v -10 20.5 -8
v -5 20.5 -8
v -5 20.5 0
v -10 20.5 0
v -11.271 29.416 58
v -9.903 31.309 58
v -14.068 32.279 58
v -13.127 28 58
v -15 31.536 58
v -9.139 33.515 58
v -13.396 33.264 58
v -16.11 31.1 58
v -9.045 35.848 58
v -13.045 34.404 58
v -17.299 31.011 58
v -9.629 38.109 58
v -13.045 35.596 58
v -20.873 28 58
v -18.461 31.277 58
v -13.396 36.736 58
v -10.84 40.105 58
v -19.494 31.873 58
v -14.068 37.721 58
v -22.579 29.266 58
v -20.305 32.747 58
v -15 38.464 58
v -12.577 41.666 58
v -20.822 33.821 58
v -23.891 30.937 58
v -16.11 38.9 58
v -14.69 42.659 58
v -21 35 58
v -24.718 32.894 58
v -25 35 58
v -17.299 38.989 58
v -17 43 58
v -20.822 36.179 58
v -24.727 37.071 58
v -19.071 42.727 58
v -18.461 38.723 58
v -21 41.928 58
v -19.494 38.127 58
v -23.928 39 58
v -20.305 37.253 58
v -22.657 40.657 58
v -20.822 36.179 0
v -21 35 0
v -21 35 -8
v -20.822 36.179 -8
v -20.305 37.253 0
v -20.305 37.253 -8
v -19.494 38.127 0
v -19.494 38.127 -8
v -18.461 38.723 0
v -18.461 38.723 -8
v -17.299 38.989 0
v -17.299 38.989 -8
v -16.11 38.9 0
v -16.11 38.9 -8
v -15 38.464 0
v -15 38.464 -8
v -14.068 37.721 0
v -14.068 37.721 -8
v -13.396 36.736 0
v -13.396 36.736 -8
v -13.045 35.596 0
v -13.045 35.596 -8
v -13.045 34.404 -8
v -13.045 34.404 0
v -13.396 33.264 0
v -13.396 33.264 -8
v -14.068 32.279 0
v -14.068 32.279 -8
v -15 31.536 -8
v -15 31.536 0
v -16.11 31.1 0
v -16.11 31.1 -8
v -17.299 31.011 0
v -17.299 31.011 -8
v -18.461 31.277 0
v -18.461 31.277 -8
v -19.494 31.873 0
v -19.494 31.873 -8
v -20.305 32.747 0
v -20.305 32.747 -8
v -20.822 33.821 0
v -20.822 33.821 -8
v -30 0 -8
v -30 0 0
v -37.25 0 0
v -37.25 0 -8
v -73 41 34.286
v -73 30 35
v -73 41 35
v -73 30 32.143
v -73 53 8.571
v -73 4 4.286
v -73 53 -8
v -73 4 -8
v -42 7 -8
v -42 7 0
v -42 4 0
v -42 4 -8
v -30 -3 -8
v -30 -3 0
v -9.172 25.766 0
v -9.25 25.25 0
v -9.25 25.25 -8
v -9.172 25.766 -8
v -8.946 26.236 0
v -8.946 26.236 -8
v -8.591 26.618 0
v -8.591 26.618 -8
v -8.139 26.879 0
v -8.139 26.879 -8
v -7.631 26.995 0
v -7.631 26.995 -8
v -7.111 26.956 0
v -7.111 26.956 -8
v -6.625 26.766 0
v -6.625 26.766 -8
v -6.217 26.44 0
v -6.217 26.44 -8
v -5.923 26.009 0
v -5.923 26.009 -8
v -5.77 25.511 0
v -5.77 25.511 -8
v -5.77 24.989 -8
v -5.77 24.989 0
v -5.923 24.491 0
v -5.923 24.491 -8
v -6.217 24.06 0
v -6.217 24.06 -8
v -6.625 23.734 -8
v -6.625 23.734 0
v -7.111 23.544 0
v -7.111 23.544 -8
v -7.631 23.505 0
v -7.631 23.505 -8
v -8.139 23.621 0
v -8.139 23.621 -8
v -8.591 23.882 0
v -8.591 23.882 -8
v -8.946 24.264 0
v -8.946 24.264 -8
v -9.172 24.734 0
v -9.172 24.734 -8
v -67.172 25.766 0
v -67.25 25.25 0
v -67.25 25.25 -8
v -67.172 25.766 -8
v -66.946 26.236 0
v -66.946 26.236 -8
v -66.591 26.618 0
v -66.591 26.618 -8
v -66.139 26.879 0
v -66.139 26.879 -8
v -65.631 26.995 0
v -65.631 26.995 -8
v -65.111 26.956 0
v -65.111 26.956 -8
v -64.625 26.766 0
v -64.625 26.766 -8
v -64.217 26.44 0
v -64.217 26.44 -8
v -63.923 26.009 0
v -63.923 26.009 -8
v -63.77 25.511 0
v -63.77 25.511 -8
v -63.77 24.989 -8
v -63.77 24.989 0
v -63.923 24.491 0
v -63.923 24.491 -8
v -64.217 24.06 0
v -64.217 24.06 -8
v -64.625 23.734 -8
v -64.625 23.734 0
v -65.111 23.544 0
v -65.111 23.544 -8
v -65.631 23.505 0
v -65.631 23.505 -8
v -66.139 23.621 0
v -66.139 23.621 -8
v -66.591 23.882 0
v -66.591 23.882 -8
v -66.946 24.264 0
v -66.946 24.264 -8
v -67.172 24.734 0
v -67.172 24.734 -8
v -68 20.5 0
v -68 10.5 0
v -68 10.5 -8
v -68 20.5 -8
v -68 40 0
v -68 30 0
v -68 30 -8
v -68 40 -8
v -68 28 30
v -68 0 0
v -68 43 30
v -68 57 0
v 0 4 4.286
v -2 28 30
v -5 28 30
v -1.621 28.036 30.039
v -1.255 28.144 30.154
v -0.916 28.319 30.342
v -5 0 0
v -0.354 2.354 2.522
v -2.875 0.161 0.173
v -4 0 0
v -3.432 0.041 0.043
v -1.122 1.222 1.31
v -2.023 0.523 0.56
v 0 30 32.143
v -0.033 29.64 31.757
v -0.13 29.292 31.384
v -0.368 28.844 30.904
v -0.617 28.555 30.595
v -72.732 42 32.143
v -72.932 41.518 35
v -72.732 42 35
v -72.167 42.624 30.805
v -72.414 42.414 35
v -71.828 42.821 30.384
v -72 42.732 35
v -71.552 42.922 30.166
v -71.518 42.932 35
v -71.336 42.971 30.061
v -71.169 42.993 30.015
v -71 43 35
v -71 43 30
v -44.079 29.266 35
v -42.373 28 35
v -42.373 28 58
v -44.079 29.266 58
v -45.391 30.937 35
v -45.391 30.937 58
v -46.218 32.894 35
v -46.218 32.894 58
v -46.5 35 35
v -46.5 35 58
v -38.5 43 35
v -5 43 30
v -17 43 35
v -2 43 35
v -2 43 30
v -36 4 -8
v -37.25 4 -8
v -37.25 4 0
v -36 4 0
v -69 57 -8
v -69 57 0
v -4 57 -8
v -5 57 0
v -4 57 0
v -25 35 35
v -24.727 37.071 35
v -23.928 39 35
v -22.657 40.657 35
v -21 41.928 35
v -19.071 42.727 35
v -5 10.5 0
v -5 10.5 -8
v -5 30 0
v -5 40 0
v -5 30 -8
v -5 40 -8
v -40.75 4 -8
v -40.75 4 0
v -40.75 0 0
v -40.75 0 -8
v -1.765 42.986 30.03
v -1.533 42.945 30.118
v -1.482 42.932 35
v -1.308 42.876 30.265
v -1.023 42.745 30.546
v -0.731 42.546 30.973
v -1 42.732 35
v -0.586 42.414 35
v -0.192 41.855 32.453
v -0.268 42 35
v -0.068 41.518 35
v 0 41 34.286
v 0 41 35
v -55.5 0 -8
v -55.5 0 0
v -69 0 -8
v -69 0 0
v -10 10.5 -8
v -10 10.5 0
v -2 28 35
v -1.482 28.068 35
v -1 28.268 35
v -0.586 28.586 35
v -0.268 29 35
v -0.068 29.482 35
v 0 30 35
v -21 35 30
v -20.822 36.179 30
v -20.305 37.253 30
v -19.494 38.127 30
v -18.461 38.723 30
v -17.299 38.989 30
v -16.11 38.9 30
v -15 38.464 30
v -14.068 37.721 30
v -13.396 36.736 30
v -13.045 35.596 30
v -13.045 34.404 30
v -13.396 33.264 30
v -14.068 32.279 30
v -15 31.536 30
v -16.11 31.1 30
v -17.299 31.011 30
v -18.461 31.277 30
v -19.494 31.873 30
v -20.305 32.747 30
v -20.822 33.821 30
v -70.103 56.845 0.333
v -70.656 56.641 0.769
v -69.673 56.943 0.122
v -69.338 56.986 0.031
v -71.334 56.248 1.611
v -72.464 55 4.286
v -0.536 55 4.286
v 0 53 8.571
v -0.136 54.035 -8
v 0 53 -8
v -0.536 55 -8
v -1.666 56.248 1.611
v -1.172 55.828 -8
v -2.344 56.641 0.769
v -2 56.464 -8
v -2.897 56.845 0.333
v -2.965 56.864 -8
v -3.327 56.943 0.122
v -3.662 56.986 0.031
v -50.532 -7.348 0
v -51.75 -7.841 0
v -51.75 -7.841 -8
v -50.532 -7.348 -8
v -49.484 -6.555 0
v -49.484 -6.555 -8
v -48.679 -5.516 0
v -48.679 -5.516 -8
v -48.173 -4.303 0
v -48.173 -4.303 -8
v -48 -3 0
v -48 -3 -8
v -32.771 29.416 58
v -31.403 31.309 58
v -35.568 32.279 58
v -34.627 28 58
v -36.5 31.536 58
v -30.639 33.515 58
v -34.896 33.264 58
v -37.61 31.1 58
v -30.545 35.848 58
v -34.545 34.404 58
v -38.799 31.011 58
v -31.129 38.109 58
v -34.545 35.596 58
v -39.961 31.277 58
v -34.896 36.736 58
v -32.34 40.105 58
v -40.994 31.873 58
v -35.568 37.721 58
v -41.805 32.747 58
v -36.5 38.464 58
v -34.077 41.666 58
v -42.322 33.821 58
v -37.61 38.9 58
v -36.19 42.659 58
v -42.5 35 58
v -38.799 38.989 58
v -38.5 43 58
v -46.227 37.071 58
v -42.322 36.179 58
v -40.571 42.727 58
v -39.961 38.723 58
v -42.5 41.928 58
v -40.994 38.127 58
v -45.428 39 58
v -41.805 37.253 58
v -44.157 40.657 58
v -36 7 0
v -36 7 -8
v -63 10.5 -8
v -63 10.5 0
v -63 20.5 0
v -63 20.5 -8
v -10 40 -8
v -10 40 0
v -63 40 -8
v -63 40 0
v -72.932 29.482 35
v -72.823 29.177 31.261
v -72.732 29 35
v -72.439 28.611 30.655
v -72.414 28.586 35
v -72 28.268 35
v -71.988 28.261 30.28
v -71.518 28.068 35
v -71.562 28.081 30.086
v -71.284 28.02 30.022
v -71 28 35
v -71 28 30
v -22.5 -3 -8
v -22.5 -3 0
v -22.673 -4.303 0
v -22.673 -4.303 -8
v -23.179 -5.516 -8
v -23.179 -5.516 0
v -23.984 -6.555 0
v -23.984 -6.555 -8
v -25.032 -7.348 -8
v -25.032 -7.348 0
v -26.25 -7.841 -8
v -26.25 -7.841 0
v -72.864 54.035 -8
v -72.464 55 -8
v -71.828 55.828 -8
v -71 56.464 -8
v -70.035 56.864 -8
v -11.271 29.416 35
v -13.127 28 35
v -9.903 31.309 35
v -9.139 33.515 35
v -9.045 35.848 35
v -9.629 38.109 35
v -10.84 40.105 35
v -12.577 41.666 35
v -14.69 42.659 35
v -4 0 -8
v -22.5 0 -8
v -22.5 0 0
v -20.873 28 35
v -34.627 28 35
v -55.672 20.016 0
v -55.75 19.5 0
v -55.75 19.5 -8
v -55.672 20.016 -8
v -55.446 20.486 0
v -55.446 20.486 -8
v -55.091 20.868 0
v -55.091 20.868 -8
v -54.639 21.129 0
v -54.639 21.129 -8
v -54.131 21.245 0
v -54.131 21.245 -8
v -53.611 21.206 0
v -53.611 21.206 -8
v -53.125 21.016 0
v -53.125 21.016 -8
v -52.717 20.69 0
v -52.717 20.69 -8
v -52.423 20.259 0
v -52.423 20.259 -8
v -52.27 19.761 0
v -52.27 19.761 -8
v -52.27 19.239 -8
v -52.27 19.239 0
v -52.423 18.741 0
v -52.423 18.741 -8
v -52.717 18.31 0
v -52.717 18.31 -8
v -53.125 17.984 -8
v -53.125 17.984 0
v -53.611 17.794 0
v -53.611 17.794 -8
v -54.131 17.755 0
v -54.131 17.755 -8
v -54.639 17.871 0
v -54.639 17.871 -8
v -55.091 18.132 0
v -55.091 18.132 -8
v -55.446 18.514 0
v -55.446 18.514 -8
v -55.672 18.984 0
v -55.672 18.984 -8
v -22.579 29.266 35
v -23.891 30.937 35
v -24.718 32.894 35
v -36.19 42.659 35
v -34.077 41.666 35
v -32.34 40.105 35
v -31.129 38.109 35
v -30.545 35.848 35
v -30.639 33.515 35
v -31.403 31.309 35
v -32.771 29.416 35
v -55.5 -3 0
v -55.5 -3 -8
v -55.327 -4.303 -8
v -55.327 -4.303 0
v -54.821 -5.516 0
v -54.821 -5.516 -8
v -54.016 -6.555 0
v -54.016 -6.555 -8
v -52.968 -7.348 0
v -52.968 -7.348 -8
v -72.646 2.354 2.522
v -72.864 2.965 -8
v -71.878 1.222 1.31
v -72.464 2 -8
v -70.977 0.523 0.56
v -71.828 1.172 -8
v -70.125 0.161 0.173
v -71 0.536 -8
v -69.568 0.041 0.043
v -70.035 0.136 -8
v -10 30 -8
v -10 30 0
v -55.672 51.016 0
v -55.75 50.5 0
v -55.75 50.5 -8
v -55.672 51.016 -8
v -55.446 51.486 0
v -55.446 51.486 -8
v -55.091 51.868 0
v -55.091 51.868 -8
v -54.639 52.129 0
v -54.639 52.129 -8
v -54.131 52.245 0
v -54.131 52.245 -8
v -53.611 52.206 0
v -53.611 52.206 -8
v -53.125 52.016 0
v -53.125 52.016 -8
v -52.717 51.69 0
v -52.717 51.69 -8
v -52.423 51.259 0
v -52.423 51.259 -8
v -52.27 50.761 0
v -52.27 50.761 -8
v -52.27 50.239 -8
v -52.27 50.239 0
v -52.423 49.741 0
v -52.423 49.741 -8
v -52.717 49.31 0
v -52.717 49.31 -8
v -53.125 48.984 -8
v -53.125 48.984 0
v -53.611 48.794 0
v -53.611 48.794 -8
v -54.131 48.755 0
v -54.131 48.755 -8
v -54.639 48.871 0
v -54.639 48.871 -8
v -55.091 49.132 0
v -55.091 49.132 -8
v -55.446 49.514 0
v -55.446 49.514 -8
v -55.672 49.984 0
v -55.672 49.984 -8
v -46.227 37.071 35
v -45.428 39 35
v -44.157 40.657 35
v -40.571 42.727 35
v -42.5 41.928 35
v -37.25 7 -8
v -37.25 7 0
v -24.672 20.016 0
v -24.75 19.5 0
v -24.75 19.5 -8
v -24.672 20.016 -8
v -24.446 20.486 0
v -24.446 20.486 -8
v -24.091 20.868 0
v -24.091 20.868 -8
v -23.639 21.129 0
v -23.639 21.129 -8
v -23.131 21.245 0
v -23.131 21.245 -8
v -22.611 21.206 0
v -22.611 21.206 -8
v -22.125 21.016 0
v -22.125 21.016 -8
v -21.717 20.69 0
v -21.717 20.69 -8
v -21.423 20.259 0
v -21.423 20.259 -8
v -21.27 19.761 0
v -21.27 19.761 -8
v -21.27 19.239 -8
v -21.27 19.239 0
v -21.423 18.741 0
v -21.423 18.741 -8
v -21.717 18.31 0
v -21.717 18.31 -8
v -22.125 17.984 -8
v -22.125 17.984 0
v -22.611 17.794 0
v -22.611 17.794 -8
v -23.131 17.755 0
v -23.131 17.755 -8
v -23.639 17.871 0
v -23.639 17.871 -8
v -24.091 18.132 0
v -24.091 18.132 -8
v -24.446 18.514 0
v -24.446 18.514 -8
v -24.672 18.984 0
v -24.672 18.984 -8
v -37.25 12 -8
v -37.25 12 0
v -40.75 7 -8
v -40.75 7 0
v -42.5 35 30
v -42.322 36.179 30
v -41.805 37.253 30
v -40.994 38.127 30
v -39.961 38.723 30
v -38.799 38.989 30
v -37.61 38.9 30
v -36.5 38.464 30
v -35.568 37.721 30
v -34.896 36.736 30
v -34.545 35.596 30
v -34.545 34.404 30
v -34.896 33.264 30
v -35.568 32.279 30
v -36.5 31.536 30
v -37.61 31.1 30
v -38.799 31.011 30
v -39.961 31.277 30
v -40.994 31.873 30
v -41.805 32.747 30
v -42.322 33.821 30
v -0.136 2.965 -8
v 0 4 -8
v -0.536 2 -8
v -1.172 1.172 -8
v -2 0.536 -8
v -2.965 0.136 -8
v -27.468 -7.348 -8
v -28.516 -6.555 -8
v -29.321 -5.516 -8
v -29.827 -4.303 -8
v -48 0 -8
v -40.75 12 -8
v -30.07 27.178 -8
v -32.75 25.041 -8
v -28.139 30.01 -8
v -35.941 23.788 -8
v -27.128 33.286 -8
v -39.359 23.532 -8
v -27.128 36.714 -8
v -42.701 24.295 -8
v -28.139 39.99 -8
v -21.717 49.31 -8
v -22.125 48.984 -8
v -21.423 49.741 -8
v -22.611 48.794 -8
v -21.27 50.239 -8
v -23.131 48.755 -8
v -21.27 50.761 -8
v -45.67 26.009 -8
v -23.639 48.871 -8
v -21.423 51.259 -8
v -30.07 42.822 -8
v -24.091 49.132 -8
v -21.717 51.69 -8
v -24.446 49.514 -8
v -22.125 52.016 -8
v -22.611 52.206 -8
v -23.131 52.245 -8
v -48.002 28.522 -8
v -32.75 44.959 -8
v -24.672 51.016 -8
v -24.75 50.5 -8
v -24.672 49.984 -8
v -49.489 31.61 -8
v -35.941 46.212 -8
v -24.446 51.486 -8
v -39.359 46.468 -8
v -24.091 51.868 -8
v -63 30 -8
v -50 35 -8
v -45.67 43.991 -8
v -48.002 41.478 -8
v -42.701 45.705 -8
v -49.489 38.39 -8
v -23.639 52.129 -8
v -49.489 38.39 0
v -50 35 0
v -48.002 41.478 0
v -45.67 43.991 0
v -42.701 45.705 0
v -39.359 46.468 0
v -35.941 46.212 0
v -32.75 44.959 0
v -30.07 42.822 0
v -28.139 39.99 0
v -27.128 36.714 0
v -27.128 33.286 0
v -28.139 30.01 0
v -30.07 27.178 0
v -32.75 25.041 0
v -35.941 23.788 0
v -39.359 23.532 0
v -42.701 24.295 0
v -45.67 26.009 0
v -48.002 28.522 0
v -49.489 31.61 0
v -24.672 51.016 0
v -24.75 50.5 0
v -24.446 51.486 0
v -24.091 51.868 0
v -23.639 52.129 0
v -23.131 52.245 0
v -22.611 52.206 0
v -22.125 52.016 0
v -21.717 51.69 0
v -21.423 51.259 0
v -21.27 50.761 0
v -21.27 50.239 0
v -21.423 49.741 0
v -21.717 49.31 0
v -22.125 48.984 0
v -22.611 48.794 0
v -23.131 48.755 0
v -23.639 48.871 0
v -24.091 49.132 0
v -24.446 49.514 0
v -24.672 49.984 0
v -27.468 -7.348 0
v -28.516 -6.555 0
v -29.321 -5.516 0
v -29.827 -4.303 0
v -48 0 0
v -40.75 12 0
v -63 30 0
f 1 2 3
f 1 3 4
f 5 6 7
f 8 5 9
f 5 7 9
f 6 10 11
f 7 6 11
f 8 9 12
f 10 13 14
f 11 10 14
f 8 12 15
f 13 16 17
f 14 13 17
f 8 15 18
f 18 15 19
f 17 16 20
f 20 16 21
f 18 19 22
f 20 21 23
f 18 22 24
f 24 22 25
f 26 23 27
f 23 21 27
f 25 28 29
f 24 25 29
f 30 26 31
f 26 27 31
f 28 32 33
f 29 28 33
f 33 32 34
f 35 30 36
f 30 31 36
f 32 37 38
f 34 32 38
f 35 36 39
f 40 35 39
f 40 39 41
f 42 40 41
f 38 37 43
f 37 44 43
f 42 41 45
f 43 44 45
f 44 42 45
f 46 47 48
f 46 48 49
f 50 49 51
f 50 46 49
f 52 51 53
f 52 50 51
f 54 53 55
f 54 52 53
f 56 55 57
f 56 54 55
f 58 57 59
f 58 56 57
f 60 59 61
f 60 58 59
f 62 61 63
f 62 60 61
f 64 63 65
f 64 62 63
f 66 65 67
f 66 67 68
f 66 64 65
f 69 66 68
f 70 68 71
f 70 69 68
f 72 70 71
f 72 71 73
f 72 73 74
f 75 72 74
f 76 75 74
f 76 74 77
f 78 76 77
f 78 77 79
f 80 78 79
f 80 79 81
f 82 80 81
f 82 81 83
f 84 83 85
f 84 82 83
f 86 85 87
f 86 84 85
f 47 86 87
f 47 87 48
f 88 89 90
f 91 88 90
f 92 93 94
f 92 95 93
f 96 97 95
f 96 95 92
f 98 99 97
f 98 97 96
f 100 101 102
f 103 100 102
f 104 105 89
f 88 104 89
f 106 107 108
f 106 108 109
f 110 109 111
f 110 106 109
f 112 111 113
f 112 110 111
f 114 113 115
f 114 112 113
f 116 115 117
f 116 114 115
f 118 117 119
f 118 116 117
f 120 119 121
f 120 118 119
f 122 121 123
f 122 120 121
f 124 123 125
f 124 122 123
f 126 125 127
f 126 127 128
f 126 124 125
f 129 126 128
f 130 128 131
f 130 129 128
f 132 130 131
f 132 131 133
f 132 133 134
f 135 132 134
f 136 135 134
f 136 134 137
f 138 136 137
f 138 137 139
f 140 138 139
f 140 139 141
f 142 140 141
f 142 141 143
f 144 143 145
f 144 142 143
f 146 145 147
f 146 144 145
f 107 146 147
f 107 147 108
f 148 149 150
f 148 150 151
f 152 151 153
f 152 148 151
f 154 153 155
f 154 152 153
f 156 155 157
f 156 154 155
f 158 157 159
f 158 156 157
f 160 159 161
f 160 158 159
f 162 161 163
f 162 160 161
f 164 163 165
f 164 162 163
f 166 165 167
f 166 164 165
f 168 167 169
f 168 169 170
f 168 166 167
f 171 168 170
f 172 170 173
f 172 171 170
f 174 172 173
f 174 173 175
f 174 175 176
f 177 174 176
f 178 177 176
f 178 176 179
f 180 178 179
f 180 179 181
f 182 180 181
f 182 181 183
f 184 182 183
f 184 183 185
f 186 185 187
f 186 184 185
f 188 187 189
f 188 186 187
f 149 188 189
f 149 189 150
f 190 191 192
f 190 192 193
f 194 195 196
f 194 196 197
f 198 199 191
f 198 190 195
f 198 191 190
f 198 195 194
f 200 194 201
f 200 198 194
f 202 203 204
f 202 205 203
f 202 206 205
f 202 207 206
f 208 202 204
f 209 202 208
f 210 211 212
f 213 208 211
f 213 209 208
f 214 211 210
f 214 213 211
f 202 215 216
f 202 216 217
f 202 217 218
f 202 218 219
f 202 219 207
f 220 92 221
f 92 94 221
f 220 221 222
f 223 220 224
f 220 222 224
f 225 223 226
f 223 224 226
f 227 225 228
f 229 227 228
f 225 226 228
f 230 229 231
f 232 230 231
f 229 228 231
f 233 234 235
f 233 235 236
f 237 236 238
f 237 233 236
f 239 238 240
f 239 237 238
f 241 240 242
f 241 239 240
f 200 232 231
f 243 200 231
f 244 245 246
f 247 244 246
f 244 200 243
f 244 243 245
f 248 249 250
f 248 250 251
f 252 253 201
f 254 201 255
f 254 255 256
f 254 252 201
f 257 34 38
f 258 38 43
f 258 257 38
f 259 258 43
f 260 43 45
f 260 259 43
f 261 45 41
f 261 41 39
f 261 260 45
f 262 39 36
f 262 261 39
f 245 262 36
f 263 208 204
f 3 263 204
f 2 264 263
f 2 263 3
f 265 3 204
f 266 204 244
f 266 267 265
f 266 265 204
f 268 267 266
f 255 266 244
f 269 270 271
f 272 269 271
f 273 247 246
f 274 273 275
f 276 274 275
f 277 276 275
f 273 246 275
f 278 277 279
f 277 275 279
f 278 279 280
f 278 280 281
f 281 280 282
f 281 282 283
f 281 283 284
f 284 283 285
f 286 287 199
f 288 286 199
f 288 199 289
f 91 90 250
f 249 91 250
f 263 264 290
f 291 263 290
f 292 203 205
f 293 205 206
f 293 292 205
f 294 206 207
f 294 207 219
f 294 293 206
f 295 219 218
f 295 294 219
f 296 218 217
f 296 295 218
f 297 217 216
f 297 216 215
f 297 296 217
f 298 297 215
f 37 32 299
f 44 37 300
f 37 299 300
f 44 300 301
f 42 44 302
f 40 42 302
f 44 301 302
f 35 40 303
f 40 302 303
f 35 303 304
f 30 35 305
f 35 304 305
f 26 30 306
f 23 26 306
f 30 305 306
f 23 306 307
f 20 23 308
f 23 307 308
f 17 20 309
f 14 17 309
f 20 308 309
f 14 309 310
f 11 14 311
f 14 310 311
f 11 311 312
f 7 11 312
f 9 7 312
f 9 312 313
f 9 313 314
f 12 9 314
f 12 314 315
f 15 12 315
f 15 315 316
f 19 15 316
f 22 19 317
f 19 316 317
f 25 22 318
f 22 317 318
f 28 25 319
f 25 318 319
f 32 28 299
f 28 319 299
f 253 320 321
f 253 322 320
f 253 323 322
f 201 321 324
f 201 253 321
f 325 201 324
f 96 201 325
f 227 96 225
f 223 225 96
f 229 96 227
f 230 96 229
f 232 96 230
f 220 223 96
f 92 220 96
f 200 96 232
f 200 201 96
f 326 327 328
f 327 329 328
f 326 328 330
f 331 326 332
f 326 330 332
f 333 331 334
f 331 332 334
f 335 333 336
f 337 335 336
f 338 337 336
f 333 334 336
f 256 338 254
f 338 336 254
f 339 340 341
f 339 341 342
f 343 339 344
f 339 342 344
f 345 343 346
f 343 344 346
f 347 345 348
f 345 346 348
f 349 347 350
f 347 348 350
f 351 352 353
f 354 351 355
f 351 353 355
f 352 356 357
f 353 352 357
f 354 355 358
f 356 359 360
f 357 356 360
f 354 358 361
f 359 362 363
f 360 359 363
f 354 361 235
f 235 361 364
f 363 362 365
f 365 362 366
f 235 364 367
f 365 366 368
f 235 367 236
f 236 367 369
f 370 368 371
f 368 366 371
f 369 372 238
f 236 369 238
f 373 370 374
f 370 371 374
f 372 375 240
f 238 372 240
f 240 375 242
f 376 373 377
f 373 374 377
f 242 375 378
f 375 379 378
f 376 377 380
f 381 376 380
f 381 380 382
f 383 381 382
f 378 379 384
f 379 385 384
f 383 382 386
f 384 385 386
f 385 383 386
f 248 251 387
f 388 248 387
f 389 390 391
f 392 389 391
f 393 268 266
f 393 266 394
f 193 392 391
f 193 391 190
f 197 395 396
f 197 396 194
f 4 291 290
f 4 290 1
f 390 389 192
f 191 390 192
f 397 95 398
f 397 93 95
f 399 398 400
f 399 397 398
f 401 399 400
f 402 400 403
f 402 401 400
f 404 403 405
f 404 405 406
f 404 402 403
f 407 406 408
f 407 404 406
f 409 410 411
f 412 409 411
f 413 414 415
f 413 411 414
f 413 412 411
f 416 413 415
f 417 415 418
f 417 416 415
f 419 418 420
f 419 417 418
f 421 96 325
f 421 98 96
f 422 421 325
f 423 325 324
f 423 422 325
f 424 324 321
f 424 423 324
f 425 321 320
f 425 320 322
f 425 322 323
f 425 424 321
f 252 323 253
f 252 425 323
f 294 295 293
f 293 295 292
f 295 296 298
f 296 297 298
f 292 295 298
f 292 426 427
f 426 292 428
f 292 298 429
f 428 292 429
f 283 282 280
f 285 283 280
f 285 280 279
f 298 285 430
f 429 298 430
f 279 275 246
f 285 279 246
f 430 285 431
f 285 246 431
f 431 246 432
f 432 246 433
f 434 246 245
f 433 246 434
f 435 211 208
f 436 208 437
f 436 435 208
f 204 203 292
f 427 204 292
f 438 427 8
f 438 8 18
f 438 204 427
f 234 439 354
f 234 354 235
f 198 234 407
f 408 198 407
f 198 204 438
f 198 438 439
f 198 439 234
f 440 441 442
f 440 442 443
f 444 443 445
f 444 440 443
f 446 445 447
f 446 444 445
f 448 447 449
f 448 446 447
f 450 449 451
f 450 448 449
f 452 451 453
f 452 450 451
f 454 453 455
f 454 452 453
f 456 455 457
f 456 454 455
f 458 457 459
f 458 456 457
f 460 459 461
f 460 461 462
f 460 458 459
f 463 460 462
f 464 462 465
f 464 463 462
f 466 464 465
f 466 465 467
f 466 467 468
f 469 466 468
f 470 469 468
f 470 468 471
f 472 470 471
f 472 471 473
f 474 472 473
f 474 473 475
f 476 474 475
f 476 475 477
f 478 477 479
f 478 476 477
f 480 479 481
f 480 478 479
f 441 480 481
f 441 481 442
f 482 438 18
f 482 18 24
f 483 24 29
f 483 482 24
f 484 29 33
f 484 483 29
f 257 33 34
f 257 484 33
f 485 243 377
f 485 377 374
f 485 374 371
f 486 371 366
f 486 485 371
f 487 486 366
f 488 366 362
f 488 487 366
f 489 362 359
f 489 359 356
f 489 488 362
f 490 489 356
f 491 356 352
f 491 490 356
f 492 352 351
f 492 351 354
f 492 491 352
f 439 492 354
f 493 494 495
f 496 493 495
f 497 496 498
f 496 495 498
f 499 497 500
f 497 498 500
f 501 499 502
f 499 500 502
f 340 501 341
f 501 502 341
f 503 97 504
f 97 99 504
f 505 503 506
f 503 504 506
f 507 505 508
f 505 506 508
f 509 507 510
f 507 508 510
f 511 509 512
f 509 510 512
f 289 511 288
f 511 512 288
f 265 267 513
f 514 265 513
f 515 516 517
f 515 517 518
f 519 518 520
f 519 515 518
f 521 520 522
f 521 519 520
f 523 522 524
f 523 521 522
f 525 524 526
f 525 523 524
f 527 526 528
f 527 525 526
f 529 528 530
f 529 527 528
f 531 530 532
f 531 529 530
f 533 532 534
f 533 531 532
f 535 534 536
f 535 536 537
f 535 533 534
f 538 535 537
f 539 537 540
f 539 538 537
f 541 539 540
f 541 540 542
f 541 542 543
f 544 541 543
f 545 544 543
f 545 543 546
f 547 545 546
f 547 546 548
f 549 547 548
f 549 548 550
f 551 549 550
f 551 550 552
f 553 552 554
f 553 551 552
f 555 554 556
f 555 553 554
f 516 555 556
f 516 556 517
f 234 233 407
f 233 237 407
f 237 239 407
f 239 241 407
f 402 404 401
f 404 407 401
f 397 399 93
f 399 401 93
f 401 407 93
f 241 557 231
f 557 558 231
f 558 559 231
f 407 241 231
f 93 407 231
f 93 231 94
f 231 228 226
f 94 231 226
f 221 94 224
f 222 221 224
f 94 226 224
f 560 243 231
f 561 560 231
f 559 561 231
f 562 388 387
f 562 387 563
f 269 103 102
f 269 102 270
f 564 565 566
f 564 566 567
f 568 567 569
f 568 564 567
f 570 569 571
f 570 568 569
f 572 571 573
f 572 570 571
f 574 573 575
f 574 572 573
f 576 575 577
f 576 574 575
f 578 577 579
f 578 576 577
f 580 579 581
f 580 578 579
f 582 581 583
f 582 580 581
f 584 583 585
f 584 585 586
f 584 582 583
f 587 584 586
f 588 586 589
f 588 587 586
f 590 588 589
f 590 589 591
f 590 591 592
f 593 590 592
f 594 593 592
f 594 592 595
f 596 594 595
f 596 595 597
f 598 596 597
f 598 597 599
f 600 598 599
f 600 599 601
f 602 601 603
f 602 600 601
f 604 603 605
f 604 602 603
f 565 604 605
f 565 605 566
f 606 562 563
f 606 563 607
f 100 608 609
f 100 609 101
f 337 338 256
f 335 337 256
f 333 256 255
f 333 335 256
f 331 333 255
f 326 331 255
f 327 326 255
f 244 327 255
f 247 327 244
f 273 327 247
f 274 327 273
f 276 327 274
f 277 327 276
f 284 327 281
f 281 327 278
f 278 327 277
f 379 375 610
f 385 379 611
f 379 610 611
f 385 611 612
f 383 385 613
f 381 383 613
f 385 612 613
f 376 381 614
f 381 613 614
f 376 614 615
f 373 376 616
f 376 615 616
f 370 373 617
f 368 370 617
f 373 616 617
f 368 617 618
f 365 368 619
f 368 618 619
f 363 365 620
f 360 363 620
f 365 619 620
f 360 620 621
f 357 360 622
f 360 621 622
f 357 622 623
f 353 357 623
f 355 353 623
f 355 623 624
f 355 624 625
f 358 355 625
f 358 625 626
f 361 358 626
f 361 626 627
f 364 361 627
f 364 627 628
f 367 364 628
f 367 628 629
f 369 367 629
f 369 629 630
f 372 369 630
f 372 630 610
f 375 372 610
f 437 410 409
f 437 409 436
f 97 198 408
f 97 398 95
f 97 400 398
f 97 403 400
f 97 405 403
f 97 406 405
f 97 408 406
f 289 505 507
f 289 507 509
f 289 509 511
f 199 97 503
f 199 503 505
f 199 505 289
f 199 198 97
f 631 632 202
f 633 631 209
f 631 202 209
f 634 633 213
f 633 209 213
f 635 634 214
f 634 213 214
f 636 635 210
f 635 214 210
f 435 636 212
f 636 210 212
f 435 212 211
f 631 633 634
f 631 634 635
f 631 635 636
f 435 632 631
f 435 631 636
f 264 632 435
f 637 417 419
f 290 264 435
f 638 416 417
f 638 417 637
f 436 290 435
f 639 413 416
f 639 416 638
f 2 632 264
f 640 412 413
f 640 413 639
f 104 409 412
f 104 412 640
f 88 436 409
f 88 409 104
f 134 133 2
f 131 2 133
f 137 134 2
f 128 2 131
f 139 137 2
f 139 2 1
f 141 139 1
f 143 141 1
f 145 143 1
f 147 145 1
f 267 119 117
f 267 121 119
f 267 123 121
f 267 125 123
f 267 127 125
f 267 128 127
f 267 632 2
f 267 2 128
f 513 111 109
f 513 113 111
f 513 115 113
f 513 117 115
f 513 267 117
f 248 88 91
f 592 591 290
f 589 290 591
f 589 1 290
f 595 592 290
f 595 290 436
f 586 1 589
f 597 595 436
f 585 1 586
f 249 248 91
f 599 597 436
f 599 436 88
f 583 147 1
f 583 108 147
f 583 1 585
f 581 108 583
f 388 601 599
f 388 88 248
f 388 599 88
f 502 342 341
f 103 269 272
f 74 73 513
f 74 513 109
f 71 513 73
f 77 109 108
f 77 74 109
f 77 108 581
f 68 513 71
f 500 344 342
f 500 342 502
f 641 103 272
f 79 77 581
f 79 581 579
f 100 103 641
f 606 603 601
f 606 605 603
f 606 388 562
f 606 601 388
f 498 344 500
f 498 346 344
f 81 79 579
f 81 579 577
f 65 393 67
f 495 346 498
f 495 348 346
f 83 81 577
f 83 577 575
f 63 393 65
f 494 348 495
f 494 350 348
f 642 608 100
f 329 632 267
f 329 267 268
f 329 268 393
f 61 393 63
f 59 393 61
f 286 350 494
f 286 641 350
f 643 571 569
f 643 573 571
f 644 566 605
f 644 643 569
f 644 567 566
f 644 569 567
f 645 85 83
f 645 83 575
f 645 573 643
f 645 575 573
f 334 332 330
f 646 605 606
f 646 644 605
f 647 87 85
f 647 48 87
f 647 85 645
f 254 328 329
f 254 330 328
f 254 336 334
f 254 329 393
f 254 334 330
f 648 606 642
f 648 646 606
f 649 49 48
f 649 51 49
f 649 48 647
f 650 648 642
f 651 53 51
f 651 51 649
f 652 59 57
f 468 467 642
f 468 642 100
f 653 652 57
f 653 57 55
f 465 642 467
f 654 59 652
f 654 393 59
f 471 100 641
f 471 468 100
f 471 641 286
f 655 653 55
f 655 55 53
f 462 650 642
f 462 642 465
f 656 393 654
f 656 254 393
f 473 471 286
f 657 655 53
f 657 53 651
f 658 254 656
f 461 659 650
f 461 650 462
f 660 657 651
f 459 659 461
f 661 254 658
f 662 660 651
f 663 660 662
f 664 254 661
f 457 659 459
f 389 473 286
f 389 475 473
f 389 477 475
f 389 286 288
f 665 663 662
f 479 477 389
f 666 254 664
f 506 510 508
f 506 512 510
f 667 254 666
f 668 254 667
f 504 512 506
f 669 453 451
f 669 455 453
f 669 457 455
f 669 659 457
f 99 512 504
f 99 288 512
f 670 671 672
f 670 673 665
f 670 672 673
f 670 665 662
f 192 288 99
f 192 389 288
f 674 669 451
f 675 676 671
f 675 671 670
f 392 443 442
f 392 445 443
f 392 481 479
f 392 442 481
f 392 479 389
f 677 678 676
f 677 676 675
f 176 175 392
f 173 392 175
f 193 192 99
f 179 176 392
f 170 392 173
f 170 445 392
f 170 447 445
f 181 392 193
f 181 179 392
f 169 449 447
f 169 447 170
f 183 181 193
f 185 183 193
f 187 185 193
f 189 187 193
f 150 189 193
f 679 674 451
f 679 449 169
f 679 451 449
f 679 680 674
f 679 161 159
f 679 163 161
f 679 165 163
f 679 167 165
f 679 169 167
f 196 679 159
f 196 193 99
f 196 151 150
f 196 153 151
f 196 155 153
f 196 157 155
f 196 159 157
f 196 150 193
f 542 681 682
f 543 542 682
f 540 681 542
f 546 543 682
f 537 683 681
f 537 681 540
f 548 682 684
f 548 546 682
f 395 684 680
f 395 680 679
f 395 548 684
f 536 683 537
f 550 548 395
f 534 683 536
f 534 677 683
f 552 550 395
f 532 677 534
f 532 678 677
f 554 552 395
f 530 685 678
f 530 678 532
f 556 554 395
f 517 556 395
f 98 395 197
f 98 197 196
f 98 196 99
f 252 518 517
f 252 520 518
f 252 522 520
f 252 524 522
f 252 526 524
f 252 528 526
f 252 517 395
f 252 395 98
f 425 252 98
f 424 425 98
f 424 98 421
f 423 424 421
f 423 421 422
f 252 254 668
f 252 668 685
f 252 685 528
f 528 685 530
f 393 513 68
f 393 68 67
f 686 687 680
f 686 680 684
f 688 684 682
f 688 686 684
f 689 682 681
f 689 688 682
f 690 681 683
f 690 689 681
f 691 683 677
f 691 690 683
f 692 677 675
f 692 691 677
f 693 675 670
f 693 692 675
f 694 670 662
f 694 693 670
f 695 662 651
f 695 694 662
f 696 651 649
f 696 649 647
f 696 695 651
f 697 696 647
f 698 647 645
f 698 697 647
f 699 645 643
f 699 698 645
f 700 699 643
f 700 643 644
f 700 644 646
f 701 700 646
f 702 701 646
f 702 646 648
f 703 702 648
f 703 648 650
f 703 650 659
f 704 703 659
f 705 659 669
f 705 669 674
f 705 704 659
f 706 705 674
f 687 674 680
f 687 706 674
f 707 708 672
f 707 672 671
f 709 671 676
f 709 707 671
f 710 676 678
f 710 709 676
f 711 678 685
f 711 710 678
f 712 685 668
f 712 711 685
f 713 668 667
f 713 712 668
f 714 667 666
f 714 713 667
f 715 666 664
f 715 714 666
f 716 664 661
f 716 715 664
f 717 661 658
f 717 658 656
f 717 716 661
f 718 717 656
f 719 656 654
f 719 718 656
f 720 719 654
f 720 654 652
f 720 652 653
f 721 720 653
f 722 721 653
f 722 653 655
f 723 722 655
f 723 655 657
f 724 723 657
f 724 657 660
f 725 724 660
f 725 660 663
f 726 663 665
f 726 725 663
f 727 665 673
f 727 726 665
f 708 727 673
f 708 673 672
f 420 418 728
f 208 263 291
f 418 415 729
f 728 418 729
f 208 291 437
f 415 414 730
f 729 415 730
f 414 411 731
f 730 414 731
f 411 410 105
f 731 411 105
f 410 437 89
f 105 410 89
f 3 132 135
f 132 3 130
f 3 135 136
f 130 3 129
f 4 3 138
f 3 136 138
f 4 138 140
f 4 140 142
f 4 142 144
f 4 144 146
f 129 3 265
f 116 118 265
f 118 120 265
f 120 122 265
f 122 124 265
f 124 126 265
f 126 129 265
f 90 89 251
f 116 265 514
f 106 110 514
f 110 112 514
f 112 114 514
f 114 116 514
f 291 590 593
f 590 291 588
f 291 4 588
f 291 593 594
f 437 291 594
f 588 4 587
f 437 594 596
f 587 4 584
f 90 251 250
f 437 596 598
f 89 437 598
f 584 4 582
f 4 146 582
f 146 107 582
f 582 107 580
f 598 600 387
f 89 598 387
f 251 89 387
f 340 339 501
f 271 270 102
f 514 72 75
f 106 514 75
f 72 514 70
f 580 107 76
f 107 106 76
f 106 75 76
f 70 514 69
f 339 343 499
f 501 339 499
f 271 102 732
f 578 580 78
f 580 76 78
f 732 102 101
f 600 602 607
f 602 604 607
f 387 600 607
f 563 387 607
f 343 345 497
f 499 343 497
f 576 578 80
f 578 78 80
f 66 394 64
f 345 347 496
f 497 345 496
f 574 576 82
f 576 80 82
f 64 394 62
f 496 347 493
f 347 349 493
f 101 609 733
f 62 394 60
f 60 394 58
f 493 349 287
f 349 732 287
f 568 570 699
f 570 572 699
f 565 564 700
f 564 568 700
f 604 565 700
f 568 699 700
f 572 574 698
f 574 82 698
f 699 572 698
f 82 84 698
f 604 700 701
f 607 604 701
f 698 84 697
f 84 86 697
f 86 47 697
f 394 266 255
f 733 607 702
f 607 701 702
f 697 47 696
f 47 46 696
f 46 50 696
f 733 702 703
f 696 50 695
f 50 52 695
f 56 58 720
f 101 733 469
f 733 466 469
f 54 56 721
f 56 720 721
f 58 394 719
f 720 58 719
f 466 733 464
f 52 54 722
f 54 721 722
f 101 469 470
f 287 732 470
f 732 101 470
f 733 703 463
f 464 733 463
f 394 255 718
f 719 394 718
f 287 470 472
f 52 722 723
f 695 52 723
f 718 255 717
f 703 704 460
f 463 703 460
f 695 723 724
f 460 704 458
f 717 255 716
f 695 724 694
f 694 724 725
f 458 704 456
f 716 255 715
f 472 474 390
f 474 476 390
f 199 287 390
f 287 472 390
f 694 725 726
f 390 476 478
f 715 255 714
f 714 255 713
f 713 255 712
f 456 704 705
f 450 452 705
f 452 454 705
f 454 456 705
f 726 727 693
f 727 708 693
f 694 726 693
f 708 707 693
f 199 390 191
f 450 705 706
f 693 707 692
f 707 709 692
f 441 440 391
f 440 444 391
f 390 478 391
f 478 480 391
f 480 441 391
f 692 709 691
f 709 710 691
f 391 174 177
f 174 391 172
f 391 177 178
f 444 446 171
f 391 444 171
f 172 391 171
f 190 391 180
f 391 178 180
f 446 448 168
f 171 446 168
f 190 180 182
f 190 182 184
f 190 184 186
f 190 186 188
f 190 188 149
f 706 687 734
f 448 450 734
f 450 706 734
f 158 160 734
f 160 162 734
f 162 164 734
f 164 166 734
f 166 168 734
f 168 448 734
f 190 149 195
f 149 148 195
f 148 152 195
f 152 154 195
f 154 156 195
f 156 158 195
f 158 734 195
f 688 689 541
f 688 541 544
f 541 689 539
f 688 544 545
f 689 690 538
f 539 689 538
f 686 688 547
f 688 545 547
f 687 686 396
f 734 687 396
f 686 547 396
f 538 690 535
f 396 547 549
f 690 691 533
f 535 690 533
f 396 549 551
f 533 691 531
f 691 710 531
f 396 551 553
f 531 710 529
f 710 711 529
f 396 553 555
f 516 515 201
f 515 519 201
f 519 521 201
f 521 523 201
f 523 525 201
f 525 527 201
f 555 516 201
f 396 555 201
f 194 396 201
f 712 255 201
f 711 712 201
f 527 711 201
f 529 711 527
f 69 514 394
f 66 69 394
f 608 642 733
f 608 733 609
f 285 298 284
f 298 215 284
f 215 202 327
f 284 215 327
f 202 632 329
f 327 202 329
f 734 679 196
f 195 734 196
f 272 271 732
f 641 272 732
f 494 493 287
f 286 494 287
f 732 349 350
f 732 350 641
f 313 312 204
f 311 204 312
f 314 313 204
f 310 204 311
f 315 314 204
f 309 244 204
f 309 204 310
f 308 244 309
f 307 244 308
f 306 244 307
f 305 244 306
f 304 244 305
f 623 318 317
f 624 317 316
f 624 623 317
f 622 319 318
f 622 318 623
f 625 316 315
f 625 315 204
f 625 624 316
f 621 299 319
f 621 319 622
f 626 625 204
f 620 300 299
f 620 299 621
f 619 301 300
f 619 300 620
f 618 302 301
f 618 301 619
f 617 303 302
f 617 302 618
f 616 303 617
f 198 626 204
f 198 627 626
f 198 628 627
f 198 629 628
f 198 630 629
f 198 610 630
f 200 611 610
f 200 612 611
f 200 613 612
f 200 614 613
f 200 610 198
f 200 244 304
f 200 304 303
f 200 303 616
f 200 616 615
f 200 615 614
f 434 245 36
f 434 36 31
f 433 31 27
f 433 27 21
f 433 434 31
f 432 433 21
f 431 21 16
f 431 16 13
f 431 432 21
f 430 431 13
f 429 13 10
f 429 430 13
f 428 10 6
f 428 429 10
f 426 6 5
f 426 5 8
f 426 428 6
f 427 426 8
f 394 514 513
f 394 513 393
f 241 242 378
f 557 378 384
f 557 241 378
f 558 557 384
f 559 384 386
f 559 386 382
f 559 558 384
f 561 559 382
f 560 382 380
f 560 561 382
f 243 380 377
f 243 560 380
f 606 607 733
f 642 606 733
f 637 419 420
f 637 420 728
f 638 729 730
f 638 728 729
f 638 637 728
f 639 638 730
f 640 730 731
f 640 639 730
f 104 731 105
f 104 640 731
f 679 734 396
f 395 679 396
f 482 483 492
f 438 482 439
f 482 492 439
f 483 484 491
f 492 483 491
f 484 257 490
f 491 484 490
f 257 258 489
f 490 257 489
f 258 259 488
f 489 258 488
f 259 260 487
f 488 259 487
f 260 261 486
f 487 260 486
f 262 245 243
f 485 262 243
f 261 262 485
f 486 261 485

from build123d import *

# Parameters (mm, degrees)
F0_W         = 5
F0_H         = 10
F0_R         = 1.75
F0_R_2       = 4
F0_R_3       = 11.5
F0_W_2       = 7.5
F0_H_2       = 8
F1_DEPTH     = 8
F3_DEPTH     = 30
F4_W         = 5
F4_H         = 15
F4_W_2       = 63
F4_R         = 4
F5_DEPTH     = 5
F6_R         = 4
F7_DEPTH     = 23
F9_DEPTH     = 73
F10_R        = 4
F11_R        = 2
F12_T1_DEPTH = 33


# Not quite as in the source:
# - a fillet or chamfer that OpenCascade refuses, or shapes differently, is made with other operations: its cross-section is extruded or revolved along the edge and cut away or added


with BuildPart() as f1:
    # F0 (on Top) → F1 (new body)
    with BuildSketch(Plane.XY):
        Polygon((0, 57), (0, 0), (22.5, 0), (30, 0), (37.25, 0), (37.25, 4), (36, 4), (36, 7), (37.25, 7), (37.25, 12), (40.75, 12), (40.75, 7), (42, 7), (42, 4), (40.75, 4), (40.75, 0), (48, 0), (55.5, 0), (73, 0), (73, 57), align=None)
        with Locations((7.5, 15.5)):
            Rectangle(F0_W, F0_H, mode=Mode.SUBTRACT)
        with Locations((23, 19.5)):
            Circle(F0_R, mode=Mode.SUBTRACT)
        with Locations((54, 19.5)):
            Circle(F0_R, mode=Mode.SUBTRACT)
        with Locations((65.5, 15.5)):
            Rectangle(F0_W, F0_H, mode=Mode.SUBTRACT)
        with Locations((7.5, 25.25)):
            Circle(F0_R, mode=Mode.SUBTRACT)
        with Locations((7.5, 35)):
            Rectangle(F0_W, F0_H, mode=Mode.SUBTRACT)
        with Locations((17, 35)):
            Circle(F0_R_2, mode=Mode.SUBTRACT)
        with Locations((23, 50.5)):
            Circle(F0_R, mode=Mode.SUBTRACT)
        with Locations((38.5, 35)):
            Circle(F0_R_3, mode=Mode.SUBTRACT)
        with Locations((65.5, 25.25)):
            Circle(F0_R, mode=Mode.SUBTRACT)
        with Locations((65.5, 35)):
            Rectangle(F0_W, F0_H, mode=Mode.SUBTRACT)
        with Locations((54, 50.5)):
            Circle(F0_R, mode=Mode.SUBTRACT)
        with Locations((51.75, -4)):
            Rectangle(F0_W_2, F0_H_2)
        with Locations((26.25, -4)):
            Rectangle(F0_W_2, F0_H_2)
    extrude(amount=-F1_DEPTH)

    # F2 (on Top) → F3 (join)
    with BuildSketch(Plane.XY):
        Polygon((0, 57), (0, 0), (5, 0), (5, 10.5), (5, 20.5), (5, 30), (5, 40), (5, 57), align=None)
        Polygon((73, 57), (68, 57), (68, 40), (68, 30), (68, 20.5), (68, 10.5), (68, 0), (73, 0), align=None)
    extrude(amount=F3_DEPTH)

    # F4 (on face) → F5 (join)
    with BuildSketch(Plane.XY.offset(30)):
        with Locations((2.5, 35.5)):
            Rectangle(F4_W, F4_H)
        with Locations((36.5, 35.5)):
            Rectangle(F4_W_2, F4_H)
        with Locations((17, 35)):
            Circle(F4_R, mode=Mode.SUBTRACT)
        with Locations((38.5, 35)):
            Circle(F4_R, mode=Mode.SUBTRACT)
        with Locations((70.5, 35.5)):
            Rectangle(F4_W, F4_H)
    extrude(amount=F5_DEPTH)

    # F6 (on face) → F7 (join)
    with BuildSketch(Plane.XY.offset(35)):
        with BuildLine():
            ThreePointArc((25, 35), (22.6568542495, 40.6568542495), (17, 43))
            ThreePointArc((17, 43), (9.2540333076, 37), (13.1270166538, 28))
            Line((13.1270166538, 28), (20.8729833462, 28))
            ThreePointArc((20.8729833462, 28), (23.8914391374, 30.9369879873), (25, 35))
        make_face()
        with Locations((17, 35)):
            Circle(F6_R, mode=Mode.SUBTRACT)
        with BuildLine():
            ThreePointArc((46.5, 35), (44.1568542495, 40.6568542495), (38.5, 43))
            ThreePointArc((38.5, 43), (30.7540333076, 37), (34.6270166538, 28))
            Line((34.6270166538, 28), (42.3729833462, 28))
            ThreePointArc((42.3729833462, 28), (45.3914391374, 30.9369879873), (46.5, 35))
        make_face()
        with Locations((38.5, 35)):
            Circle(F6_R, mode=Mode.SUBTRACT)
    extrude(amount=F7_DEPTH)

    # F8 (on face) → F9 (cut)
    with BuildSketch(Plane(origin=(0, 0, 0), x_dir=(0, -1, 0), z_dir=(-1, 0, 0))):
        Polygon((-57, 0), (-43, 30), (-57, 30), align=None)
        Polygon((0, 30), (-28, 30), (0, 0), align=None)
    extrude(amount=-F9_DEPTH, mode=Mode.SUBTRACT)

    # F10
    f10_edges = [f1.edges().sort_by_distance(p)[0] for p in [
        (0, 57, -4),
        (73, 57, -4),
        (0, 0, -4),
        (73, 0, -4),
    ]]
    fillet(f10_edges, radius=F10_R)

    # F11
    f11_edges = [f1.edges().sort_by_distance(p)[0] for p in [
        (73, 28, 32.5),
        (0, 28, 32.5),
        (0, 43, 32.5),
        (73, 43, 32.5),
    ]]
    fillet(f11_edges, radius=F11_R)

    # F12: fillet of radius 5 on 4 edges, made by hand

    # F12_s2 → F12_t1 (cut)
    with BuildSketch(Plane.XY.offset(-20.5)):
        with BuildLine():
            ThreePointArc((25, -8), (28.5355339059, -6.5355339059), (30, -3))
            Line((30, -3), (30, -8))
            Line((30, -8), (25, -8))
        make_face()
        with BuildLine():
            ThreePointArc((22.5, -3), (23.9644660941, -6.5355339059), (27.5, -8))
            Line((27.5, -8), (22.5, -8))
            Line((22.5, -8), (22.5, -3))
        make_face()
        with BuildLine():
            ThreePointArc((55.5, -3), (54.0355339059, -6.5355339059), (50.5, -8))
            Line((50.5, -8), (55.5, -8))
            Line((55.5, -8), (55.5, -3))
        make_face()
        with BuildLine():
            ThreePointArc((53, -8), (49.4644660941, -6.5355339059), (48, -3))
            Line((48, -3), (48, -8))
            Line((48, -8), (53, -8))
        make_face()
    extrude(amount=F12_T1_DEPTH, mode=Mode.SUBTRACT)


with BuildPart() as f13_1:
    # F13: instance of F1
    add(f1.part.mirror(Plane(origin=(0, 30.6667140421, 8.8934527193), x_dir=(0, -1, 0), z_dir=(-1, 0, 0))))


solid = f13_1.part
